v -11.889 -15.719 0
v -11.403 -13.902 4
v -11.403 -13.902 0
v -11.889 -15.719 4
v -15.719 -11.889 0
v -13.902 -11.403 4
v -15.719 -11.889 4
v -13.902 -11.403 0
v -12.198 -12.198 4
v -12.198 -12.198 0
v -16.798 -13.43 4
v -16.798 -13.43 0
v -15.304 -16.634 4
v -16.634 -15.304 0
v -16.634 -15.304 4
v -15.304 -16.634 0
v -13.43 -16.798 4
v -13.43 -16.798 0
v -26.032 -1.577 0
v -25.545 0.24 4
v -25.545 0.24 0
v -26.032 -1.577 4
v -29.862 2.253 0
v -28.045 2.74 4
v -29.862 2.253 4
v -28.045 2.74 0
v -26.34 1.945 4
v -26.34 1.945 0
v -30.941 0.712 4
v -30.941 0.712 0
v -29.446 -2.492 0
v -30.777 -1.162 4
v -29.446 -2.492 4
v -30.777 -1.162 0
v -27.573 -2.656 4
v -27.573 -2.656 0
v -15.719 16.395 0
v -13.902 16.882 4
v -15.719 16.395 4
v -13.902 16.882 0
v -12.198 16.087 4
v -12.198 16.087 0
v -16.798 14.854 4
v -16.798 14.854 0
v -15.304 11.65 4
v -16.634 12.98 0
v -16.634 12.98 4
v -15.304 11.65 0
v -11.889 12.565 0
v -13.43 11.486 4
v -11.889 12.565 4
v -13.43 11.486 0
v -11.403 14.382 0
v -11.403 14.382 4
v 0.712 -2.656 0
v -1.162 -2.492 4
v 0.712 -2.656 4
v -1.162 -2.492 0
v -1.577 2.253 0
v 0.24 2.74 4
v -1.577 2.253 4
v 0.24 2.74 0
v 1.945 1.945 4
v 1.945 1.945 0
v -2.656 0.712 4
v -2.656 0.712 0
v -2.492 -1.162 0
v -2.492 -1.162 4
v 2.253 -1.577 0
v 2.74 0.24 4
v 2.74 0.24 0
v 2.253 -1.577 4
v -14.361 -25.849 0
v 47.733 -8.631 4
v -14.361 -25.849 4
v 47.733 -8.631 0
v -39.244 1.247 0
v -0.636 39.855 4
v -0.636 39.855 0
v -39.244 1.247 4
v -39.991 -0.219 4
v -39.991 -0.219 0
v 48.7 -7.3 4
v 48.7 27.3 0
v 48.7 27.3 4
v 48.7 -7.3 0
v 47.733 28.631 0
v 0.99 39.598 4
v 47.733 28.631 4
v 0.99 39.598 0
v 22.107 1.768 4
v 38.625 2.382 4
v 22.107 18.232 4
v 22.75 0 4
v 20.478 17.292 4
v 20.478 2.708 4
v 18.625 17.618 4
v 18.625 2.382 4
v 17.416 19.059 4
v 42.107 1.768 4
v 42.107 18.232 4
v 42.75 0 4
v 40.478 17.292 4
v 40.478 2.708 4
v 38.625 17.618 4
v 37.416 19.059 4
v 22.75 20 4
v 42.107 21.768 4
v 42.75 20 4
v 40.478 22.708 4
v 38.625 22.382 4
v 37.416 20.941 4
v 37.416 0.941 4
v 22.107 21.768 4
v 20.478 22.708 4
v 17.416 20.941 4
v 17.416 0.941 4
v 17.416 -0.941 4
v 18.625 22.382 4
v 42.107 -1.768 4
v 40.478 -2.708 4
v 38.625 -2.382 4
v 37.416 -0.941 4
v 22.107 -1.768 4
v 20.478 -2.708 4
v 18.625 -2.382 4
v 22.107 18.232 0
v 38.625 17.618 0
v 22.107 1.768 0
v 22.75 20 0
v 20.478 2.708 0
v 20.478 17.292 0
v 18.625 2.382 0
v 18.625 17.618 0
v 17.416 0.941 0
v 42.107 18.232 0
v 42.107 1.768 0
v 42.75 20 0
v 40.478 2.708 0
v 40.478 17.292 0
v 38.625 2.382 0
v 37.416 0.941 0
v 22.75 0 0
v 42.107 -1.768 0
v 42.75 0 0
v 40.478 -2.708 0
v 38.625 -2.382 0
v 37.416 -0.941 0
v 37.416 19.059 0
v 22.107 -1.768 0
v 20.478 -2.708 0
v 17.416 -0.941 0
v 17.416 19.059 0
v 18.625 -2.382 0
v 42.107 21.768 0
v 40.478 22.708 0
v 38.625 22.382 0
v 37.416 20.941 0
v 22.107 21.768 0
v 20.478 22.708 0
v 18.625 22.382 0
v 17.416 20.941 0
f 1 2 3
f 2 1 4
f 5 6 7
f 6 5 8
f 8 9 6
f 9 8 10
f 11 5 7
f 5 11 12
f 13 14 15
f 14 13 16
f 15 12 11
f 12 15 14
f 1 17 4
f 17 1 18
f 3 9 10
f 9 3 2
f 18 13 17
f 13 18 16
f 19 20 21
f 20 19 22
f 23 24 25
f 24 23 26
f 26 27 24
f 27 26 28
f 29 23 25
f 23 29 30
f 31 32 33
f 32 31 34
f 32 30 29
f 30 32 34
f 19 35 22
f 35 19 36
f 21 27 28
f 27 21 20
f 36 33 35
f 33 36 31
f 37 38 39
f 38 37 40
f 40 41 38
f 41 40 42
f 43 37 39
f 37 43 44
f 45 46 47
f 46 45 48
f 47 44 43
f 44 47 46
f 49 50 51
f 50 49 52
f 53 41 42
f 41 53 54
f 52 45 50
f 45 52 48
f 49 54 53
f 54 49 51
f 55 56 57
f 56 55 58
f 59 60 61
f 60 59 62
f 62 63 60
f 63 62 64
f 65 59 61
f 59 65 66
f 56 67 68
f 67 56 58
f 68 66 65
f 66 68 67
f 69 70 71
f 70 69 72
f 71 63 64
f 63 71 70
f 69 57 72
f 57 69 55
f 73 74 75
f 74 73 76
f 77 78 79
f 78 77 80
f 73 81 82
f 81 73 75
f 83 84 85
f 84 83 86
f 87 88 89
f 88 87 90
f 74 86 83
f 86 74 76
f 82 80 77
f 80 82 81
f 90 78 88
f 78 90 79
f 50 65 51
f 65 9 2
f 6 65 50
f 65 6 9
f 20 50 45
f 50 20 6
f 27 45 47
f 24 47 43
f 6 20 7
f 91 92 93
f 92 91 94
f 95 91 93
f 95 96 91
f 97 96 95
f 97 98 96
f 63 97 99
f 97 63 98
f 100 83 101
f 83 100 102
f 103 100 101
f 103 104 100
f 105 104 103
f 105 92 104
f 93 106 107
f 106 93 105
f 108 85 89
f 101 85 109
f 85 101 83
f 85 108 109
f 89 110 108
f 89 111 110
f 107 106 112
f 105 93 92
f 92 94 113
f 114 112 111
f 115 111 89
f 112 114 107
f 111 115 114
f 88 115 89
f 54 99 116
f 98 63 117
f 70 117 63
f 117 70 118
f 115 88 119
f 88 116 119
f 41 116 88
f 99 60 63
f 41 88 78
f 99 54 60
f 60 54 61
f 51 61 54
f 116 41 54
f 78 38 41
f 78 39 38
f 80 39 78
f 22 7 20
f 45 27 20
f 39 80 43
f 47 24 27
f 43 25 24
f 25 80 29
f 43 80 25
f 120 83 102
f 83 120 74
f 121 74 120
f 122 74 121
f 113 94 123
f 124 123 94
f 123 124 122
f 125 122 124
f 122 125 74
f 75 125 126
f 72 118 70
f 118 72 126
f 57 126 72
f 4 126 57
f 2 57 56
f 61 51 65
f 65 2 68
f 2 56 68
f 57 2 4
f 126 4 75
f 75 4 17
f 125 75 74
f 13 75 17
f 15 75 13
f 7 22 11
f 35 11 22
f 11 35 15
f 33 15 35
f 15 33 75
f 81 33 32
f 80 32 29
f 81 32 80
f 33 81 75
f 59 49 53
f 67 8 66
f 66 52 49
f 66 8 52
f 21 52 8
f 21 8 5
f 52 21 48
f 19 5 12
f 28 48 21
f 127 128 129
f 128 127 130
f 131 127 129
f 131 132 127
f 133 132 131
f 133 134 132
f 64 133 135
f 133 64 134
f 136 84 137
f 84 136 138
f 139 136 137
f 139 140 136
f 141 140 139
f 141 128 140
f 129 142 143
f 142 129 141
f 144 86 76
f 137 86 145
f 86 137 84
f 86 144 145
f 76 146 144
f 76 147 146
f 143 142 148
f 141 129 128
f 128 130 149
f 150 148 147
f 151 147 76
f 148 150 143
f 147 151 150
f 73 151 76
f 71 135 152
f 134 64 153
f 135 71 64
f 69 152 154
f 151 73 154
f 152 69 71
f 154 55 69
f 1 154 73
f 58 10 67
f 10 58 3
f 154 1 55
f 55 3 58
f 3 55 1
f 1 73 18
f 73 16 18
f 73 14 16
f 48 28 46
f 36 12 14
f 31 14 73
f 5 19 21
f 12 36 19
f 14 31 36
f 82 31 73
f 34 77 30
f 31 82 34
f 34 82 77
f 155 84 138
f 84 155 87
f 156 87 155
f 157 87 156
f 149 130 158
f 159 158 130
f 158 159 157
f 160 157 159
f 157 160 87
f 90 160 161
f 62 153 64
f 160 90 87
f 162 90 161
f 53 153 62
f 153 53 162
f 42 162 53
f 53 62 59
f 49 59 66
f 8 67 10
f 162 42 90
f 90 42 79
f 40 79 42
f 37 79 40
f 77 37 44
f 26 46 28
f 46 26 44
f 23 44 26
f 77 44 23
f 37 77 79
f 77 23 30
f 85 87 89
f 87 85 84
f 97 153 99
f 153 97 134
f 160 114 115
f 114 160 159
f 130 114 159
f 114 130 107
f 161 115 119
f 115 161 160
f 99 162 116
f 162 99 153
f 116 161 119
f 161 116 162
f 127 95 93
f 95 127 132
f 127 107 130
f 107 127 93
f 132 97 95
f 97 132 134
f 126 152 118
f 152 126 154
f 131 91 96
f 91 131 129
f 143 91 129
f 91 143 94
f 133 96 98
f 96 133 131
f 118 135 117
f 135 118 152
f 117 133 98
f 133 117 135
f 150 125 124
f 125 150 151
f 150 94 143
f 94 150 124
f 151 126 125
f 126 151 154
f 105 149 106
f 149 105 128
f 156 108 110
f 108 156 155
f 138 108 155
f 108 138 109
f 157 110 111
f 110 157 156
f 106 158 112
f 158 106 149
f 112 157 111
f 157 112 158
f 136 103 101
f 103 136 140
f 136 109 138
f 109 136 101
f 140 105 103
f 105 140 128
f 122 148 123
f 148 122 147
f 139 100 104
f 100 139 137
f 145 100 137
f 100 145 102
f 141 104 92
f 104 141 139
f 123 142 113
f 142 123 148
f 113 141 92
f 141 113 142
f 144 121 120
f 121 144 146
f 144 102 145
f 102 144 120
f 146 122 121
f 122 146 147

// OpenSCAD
// rob@openpart.co.uk 20140202-02:02
// 8 hole joining plate to connect 40mm to 20mm NOMINAL extrusion at 45 degrees
// V-Slot & others

module roundedRect(size, radius) {
	x = size[0];
	y = size[1];
	z = size[2];
	linear_extrude(height=z)
	hull()
	{
		// place 4 circles in the corners, with the given radius
		translate([(-x/2)+(radius/2), (-y/2)+(radius/2), 0])
		circle(r=radius);
		translate([(x/2)-(radius/2), (-y/2)+(radius/2), 0])
		circle(r=radius);
		translate([(-x/2)+(radius/2), (y/2)-(radius/2), 0])
		circle(r=radius);
		translate([(x/2)-(radius/2), (y/2)-(radius/2), 0])
		circle(r=radius);
	}
}
angle = 45;
hole = 5.5 / 2;
plate_width1 = 36;
plate_width2 = 36;
plate_length1 = 56;
plate_length2 = 16;
plate_thickness = 4;
extend_past_thickness = 2;
corner_radius = 1.4;
difference() {
	hull () {
		rotate([0,0,angle]) {
			translate([0, 10, 0])
				roundedRect ([plate_length1, plate_width1, plate_thickness], corner_radius);
		}
		translate([40, 10, 0])
				roundedRect ([plate_length2, plate_width2, plate_thickness], corner_radius);
		}
		translate([20,20,-1])
			cylinder(h = (extend_past_thickness+plate_thickness+2), r = hole);
		translate([20,0,-1])
			cylinder(h = (extend_past_thickness+plate_thickness+2), r = hole);
		translate([40,20,-1])
			cylinder(h = (extend_past_thickness+plate_thickness+2), r = hole);
		translate([40,0,-1])
			cylinder(h = (extend_past_thickness+plate_thickness+2), r = hole);

		rotate([0,0,angle]) {
			translate([-20,0,-1])
				cylinder(h = (extend_past_thickness+plate_thickness+2), r = hole);
			translate([-20,20,-1])
				cylinder(h = (extend_past_thickness+plate_thickness+2), r = hole);
			translate([0,20,-1])
				cylinder(h = (extend_past_thickness+plate_thickness+2), r = hole);
			translate([0,0,-1])
				cylinder(h = (extend_past_thickness+plate_thickness+2), r = hole);
		}
}
